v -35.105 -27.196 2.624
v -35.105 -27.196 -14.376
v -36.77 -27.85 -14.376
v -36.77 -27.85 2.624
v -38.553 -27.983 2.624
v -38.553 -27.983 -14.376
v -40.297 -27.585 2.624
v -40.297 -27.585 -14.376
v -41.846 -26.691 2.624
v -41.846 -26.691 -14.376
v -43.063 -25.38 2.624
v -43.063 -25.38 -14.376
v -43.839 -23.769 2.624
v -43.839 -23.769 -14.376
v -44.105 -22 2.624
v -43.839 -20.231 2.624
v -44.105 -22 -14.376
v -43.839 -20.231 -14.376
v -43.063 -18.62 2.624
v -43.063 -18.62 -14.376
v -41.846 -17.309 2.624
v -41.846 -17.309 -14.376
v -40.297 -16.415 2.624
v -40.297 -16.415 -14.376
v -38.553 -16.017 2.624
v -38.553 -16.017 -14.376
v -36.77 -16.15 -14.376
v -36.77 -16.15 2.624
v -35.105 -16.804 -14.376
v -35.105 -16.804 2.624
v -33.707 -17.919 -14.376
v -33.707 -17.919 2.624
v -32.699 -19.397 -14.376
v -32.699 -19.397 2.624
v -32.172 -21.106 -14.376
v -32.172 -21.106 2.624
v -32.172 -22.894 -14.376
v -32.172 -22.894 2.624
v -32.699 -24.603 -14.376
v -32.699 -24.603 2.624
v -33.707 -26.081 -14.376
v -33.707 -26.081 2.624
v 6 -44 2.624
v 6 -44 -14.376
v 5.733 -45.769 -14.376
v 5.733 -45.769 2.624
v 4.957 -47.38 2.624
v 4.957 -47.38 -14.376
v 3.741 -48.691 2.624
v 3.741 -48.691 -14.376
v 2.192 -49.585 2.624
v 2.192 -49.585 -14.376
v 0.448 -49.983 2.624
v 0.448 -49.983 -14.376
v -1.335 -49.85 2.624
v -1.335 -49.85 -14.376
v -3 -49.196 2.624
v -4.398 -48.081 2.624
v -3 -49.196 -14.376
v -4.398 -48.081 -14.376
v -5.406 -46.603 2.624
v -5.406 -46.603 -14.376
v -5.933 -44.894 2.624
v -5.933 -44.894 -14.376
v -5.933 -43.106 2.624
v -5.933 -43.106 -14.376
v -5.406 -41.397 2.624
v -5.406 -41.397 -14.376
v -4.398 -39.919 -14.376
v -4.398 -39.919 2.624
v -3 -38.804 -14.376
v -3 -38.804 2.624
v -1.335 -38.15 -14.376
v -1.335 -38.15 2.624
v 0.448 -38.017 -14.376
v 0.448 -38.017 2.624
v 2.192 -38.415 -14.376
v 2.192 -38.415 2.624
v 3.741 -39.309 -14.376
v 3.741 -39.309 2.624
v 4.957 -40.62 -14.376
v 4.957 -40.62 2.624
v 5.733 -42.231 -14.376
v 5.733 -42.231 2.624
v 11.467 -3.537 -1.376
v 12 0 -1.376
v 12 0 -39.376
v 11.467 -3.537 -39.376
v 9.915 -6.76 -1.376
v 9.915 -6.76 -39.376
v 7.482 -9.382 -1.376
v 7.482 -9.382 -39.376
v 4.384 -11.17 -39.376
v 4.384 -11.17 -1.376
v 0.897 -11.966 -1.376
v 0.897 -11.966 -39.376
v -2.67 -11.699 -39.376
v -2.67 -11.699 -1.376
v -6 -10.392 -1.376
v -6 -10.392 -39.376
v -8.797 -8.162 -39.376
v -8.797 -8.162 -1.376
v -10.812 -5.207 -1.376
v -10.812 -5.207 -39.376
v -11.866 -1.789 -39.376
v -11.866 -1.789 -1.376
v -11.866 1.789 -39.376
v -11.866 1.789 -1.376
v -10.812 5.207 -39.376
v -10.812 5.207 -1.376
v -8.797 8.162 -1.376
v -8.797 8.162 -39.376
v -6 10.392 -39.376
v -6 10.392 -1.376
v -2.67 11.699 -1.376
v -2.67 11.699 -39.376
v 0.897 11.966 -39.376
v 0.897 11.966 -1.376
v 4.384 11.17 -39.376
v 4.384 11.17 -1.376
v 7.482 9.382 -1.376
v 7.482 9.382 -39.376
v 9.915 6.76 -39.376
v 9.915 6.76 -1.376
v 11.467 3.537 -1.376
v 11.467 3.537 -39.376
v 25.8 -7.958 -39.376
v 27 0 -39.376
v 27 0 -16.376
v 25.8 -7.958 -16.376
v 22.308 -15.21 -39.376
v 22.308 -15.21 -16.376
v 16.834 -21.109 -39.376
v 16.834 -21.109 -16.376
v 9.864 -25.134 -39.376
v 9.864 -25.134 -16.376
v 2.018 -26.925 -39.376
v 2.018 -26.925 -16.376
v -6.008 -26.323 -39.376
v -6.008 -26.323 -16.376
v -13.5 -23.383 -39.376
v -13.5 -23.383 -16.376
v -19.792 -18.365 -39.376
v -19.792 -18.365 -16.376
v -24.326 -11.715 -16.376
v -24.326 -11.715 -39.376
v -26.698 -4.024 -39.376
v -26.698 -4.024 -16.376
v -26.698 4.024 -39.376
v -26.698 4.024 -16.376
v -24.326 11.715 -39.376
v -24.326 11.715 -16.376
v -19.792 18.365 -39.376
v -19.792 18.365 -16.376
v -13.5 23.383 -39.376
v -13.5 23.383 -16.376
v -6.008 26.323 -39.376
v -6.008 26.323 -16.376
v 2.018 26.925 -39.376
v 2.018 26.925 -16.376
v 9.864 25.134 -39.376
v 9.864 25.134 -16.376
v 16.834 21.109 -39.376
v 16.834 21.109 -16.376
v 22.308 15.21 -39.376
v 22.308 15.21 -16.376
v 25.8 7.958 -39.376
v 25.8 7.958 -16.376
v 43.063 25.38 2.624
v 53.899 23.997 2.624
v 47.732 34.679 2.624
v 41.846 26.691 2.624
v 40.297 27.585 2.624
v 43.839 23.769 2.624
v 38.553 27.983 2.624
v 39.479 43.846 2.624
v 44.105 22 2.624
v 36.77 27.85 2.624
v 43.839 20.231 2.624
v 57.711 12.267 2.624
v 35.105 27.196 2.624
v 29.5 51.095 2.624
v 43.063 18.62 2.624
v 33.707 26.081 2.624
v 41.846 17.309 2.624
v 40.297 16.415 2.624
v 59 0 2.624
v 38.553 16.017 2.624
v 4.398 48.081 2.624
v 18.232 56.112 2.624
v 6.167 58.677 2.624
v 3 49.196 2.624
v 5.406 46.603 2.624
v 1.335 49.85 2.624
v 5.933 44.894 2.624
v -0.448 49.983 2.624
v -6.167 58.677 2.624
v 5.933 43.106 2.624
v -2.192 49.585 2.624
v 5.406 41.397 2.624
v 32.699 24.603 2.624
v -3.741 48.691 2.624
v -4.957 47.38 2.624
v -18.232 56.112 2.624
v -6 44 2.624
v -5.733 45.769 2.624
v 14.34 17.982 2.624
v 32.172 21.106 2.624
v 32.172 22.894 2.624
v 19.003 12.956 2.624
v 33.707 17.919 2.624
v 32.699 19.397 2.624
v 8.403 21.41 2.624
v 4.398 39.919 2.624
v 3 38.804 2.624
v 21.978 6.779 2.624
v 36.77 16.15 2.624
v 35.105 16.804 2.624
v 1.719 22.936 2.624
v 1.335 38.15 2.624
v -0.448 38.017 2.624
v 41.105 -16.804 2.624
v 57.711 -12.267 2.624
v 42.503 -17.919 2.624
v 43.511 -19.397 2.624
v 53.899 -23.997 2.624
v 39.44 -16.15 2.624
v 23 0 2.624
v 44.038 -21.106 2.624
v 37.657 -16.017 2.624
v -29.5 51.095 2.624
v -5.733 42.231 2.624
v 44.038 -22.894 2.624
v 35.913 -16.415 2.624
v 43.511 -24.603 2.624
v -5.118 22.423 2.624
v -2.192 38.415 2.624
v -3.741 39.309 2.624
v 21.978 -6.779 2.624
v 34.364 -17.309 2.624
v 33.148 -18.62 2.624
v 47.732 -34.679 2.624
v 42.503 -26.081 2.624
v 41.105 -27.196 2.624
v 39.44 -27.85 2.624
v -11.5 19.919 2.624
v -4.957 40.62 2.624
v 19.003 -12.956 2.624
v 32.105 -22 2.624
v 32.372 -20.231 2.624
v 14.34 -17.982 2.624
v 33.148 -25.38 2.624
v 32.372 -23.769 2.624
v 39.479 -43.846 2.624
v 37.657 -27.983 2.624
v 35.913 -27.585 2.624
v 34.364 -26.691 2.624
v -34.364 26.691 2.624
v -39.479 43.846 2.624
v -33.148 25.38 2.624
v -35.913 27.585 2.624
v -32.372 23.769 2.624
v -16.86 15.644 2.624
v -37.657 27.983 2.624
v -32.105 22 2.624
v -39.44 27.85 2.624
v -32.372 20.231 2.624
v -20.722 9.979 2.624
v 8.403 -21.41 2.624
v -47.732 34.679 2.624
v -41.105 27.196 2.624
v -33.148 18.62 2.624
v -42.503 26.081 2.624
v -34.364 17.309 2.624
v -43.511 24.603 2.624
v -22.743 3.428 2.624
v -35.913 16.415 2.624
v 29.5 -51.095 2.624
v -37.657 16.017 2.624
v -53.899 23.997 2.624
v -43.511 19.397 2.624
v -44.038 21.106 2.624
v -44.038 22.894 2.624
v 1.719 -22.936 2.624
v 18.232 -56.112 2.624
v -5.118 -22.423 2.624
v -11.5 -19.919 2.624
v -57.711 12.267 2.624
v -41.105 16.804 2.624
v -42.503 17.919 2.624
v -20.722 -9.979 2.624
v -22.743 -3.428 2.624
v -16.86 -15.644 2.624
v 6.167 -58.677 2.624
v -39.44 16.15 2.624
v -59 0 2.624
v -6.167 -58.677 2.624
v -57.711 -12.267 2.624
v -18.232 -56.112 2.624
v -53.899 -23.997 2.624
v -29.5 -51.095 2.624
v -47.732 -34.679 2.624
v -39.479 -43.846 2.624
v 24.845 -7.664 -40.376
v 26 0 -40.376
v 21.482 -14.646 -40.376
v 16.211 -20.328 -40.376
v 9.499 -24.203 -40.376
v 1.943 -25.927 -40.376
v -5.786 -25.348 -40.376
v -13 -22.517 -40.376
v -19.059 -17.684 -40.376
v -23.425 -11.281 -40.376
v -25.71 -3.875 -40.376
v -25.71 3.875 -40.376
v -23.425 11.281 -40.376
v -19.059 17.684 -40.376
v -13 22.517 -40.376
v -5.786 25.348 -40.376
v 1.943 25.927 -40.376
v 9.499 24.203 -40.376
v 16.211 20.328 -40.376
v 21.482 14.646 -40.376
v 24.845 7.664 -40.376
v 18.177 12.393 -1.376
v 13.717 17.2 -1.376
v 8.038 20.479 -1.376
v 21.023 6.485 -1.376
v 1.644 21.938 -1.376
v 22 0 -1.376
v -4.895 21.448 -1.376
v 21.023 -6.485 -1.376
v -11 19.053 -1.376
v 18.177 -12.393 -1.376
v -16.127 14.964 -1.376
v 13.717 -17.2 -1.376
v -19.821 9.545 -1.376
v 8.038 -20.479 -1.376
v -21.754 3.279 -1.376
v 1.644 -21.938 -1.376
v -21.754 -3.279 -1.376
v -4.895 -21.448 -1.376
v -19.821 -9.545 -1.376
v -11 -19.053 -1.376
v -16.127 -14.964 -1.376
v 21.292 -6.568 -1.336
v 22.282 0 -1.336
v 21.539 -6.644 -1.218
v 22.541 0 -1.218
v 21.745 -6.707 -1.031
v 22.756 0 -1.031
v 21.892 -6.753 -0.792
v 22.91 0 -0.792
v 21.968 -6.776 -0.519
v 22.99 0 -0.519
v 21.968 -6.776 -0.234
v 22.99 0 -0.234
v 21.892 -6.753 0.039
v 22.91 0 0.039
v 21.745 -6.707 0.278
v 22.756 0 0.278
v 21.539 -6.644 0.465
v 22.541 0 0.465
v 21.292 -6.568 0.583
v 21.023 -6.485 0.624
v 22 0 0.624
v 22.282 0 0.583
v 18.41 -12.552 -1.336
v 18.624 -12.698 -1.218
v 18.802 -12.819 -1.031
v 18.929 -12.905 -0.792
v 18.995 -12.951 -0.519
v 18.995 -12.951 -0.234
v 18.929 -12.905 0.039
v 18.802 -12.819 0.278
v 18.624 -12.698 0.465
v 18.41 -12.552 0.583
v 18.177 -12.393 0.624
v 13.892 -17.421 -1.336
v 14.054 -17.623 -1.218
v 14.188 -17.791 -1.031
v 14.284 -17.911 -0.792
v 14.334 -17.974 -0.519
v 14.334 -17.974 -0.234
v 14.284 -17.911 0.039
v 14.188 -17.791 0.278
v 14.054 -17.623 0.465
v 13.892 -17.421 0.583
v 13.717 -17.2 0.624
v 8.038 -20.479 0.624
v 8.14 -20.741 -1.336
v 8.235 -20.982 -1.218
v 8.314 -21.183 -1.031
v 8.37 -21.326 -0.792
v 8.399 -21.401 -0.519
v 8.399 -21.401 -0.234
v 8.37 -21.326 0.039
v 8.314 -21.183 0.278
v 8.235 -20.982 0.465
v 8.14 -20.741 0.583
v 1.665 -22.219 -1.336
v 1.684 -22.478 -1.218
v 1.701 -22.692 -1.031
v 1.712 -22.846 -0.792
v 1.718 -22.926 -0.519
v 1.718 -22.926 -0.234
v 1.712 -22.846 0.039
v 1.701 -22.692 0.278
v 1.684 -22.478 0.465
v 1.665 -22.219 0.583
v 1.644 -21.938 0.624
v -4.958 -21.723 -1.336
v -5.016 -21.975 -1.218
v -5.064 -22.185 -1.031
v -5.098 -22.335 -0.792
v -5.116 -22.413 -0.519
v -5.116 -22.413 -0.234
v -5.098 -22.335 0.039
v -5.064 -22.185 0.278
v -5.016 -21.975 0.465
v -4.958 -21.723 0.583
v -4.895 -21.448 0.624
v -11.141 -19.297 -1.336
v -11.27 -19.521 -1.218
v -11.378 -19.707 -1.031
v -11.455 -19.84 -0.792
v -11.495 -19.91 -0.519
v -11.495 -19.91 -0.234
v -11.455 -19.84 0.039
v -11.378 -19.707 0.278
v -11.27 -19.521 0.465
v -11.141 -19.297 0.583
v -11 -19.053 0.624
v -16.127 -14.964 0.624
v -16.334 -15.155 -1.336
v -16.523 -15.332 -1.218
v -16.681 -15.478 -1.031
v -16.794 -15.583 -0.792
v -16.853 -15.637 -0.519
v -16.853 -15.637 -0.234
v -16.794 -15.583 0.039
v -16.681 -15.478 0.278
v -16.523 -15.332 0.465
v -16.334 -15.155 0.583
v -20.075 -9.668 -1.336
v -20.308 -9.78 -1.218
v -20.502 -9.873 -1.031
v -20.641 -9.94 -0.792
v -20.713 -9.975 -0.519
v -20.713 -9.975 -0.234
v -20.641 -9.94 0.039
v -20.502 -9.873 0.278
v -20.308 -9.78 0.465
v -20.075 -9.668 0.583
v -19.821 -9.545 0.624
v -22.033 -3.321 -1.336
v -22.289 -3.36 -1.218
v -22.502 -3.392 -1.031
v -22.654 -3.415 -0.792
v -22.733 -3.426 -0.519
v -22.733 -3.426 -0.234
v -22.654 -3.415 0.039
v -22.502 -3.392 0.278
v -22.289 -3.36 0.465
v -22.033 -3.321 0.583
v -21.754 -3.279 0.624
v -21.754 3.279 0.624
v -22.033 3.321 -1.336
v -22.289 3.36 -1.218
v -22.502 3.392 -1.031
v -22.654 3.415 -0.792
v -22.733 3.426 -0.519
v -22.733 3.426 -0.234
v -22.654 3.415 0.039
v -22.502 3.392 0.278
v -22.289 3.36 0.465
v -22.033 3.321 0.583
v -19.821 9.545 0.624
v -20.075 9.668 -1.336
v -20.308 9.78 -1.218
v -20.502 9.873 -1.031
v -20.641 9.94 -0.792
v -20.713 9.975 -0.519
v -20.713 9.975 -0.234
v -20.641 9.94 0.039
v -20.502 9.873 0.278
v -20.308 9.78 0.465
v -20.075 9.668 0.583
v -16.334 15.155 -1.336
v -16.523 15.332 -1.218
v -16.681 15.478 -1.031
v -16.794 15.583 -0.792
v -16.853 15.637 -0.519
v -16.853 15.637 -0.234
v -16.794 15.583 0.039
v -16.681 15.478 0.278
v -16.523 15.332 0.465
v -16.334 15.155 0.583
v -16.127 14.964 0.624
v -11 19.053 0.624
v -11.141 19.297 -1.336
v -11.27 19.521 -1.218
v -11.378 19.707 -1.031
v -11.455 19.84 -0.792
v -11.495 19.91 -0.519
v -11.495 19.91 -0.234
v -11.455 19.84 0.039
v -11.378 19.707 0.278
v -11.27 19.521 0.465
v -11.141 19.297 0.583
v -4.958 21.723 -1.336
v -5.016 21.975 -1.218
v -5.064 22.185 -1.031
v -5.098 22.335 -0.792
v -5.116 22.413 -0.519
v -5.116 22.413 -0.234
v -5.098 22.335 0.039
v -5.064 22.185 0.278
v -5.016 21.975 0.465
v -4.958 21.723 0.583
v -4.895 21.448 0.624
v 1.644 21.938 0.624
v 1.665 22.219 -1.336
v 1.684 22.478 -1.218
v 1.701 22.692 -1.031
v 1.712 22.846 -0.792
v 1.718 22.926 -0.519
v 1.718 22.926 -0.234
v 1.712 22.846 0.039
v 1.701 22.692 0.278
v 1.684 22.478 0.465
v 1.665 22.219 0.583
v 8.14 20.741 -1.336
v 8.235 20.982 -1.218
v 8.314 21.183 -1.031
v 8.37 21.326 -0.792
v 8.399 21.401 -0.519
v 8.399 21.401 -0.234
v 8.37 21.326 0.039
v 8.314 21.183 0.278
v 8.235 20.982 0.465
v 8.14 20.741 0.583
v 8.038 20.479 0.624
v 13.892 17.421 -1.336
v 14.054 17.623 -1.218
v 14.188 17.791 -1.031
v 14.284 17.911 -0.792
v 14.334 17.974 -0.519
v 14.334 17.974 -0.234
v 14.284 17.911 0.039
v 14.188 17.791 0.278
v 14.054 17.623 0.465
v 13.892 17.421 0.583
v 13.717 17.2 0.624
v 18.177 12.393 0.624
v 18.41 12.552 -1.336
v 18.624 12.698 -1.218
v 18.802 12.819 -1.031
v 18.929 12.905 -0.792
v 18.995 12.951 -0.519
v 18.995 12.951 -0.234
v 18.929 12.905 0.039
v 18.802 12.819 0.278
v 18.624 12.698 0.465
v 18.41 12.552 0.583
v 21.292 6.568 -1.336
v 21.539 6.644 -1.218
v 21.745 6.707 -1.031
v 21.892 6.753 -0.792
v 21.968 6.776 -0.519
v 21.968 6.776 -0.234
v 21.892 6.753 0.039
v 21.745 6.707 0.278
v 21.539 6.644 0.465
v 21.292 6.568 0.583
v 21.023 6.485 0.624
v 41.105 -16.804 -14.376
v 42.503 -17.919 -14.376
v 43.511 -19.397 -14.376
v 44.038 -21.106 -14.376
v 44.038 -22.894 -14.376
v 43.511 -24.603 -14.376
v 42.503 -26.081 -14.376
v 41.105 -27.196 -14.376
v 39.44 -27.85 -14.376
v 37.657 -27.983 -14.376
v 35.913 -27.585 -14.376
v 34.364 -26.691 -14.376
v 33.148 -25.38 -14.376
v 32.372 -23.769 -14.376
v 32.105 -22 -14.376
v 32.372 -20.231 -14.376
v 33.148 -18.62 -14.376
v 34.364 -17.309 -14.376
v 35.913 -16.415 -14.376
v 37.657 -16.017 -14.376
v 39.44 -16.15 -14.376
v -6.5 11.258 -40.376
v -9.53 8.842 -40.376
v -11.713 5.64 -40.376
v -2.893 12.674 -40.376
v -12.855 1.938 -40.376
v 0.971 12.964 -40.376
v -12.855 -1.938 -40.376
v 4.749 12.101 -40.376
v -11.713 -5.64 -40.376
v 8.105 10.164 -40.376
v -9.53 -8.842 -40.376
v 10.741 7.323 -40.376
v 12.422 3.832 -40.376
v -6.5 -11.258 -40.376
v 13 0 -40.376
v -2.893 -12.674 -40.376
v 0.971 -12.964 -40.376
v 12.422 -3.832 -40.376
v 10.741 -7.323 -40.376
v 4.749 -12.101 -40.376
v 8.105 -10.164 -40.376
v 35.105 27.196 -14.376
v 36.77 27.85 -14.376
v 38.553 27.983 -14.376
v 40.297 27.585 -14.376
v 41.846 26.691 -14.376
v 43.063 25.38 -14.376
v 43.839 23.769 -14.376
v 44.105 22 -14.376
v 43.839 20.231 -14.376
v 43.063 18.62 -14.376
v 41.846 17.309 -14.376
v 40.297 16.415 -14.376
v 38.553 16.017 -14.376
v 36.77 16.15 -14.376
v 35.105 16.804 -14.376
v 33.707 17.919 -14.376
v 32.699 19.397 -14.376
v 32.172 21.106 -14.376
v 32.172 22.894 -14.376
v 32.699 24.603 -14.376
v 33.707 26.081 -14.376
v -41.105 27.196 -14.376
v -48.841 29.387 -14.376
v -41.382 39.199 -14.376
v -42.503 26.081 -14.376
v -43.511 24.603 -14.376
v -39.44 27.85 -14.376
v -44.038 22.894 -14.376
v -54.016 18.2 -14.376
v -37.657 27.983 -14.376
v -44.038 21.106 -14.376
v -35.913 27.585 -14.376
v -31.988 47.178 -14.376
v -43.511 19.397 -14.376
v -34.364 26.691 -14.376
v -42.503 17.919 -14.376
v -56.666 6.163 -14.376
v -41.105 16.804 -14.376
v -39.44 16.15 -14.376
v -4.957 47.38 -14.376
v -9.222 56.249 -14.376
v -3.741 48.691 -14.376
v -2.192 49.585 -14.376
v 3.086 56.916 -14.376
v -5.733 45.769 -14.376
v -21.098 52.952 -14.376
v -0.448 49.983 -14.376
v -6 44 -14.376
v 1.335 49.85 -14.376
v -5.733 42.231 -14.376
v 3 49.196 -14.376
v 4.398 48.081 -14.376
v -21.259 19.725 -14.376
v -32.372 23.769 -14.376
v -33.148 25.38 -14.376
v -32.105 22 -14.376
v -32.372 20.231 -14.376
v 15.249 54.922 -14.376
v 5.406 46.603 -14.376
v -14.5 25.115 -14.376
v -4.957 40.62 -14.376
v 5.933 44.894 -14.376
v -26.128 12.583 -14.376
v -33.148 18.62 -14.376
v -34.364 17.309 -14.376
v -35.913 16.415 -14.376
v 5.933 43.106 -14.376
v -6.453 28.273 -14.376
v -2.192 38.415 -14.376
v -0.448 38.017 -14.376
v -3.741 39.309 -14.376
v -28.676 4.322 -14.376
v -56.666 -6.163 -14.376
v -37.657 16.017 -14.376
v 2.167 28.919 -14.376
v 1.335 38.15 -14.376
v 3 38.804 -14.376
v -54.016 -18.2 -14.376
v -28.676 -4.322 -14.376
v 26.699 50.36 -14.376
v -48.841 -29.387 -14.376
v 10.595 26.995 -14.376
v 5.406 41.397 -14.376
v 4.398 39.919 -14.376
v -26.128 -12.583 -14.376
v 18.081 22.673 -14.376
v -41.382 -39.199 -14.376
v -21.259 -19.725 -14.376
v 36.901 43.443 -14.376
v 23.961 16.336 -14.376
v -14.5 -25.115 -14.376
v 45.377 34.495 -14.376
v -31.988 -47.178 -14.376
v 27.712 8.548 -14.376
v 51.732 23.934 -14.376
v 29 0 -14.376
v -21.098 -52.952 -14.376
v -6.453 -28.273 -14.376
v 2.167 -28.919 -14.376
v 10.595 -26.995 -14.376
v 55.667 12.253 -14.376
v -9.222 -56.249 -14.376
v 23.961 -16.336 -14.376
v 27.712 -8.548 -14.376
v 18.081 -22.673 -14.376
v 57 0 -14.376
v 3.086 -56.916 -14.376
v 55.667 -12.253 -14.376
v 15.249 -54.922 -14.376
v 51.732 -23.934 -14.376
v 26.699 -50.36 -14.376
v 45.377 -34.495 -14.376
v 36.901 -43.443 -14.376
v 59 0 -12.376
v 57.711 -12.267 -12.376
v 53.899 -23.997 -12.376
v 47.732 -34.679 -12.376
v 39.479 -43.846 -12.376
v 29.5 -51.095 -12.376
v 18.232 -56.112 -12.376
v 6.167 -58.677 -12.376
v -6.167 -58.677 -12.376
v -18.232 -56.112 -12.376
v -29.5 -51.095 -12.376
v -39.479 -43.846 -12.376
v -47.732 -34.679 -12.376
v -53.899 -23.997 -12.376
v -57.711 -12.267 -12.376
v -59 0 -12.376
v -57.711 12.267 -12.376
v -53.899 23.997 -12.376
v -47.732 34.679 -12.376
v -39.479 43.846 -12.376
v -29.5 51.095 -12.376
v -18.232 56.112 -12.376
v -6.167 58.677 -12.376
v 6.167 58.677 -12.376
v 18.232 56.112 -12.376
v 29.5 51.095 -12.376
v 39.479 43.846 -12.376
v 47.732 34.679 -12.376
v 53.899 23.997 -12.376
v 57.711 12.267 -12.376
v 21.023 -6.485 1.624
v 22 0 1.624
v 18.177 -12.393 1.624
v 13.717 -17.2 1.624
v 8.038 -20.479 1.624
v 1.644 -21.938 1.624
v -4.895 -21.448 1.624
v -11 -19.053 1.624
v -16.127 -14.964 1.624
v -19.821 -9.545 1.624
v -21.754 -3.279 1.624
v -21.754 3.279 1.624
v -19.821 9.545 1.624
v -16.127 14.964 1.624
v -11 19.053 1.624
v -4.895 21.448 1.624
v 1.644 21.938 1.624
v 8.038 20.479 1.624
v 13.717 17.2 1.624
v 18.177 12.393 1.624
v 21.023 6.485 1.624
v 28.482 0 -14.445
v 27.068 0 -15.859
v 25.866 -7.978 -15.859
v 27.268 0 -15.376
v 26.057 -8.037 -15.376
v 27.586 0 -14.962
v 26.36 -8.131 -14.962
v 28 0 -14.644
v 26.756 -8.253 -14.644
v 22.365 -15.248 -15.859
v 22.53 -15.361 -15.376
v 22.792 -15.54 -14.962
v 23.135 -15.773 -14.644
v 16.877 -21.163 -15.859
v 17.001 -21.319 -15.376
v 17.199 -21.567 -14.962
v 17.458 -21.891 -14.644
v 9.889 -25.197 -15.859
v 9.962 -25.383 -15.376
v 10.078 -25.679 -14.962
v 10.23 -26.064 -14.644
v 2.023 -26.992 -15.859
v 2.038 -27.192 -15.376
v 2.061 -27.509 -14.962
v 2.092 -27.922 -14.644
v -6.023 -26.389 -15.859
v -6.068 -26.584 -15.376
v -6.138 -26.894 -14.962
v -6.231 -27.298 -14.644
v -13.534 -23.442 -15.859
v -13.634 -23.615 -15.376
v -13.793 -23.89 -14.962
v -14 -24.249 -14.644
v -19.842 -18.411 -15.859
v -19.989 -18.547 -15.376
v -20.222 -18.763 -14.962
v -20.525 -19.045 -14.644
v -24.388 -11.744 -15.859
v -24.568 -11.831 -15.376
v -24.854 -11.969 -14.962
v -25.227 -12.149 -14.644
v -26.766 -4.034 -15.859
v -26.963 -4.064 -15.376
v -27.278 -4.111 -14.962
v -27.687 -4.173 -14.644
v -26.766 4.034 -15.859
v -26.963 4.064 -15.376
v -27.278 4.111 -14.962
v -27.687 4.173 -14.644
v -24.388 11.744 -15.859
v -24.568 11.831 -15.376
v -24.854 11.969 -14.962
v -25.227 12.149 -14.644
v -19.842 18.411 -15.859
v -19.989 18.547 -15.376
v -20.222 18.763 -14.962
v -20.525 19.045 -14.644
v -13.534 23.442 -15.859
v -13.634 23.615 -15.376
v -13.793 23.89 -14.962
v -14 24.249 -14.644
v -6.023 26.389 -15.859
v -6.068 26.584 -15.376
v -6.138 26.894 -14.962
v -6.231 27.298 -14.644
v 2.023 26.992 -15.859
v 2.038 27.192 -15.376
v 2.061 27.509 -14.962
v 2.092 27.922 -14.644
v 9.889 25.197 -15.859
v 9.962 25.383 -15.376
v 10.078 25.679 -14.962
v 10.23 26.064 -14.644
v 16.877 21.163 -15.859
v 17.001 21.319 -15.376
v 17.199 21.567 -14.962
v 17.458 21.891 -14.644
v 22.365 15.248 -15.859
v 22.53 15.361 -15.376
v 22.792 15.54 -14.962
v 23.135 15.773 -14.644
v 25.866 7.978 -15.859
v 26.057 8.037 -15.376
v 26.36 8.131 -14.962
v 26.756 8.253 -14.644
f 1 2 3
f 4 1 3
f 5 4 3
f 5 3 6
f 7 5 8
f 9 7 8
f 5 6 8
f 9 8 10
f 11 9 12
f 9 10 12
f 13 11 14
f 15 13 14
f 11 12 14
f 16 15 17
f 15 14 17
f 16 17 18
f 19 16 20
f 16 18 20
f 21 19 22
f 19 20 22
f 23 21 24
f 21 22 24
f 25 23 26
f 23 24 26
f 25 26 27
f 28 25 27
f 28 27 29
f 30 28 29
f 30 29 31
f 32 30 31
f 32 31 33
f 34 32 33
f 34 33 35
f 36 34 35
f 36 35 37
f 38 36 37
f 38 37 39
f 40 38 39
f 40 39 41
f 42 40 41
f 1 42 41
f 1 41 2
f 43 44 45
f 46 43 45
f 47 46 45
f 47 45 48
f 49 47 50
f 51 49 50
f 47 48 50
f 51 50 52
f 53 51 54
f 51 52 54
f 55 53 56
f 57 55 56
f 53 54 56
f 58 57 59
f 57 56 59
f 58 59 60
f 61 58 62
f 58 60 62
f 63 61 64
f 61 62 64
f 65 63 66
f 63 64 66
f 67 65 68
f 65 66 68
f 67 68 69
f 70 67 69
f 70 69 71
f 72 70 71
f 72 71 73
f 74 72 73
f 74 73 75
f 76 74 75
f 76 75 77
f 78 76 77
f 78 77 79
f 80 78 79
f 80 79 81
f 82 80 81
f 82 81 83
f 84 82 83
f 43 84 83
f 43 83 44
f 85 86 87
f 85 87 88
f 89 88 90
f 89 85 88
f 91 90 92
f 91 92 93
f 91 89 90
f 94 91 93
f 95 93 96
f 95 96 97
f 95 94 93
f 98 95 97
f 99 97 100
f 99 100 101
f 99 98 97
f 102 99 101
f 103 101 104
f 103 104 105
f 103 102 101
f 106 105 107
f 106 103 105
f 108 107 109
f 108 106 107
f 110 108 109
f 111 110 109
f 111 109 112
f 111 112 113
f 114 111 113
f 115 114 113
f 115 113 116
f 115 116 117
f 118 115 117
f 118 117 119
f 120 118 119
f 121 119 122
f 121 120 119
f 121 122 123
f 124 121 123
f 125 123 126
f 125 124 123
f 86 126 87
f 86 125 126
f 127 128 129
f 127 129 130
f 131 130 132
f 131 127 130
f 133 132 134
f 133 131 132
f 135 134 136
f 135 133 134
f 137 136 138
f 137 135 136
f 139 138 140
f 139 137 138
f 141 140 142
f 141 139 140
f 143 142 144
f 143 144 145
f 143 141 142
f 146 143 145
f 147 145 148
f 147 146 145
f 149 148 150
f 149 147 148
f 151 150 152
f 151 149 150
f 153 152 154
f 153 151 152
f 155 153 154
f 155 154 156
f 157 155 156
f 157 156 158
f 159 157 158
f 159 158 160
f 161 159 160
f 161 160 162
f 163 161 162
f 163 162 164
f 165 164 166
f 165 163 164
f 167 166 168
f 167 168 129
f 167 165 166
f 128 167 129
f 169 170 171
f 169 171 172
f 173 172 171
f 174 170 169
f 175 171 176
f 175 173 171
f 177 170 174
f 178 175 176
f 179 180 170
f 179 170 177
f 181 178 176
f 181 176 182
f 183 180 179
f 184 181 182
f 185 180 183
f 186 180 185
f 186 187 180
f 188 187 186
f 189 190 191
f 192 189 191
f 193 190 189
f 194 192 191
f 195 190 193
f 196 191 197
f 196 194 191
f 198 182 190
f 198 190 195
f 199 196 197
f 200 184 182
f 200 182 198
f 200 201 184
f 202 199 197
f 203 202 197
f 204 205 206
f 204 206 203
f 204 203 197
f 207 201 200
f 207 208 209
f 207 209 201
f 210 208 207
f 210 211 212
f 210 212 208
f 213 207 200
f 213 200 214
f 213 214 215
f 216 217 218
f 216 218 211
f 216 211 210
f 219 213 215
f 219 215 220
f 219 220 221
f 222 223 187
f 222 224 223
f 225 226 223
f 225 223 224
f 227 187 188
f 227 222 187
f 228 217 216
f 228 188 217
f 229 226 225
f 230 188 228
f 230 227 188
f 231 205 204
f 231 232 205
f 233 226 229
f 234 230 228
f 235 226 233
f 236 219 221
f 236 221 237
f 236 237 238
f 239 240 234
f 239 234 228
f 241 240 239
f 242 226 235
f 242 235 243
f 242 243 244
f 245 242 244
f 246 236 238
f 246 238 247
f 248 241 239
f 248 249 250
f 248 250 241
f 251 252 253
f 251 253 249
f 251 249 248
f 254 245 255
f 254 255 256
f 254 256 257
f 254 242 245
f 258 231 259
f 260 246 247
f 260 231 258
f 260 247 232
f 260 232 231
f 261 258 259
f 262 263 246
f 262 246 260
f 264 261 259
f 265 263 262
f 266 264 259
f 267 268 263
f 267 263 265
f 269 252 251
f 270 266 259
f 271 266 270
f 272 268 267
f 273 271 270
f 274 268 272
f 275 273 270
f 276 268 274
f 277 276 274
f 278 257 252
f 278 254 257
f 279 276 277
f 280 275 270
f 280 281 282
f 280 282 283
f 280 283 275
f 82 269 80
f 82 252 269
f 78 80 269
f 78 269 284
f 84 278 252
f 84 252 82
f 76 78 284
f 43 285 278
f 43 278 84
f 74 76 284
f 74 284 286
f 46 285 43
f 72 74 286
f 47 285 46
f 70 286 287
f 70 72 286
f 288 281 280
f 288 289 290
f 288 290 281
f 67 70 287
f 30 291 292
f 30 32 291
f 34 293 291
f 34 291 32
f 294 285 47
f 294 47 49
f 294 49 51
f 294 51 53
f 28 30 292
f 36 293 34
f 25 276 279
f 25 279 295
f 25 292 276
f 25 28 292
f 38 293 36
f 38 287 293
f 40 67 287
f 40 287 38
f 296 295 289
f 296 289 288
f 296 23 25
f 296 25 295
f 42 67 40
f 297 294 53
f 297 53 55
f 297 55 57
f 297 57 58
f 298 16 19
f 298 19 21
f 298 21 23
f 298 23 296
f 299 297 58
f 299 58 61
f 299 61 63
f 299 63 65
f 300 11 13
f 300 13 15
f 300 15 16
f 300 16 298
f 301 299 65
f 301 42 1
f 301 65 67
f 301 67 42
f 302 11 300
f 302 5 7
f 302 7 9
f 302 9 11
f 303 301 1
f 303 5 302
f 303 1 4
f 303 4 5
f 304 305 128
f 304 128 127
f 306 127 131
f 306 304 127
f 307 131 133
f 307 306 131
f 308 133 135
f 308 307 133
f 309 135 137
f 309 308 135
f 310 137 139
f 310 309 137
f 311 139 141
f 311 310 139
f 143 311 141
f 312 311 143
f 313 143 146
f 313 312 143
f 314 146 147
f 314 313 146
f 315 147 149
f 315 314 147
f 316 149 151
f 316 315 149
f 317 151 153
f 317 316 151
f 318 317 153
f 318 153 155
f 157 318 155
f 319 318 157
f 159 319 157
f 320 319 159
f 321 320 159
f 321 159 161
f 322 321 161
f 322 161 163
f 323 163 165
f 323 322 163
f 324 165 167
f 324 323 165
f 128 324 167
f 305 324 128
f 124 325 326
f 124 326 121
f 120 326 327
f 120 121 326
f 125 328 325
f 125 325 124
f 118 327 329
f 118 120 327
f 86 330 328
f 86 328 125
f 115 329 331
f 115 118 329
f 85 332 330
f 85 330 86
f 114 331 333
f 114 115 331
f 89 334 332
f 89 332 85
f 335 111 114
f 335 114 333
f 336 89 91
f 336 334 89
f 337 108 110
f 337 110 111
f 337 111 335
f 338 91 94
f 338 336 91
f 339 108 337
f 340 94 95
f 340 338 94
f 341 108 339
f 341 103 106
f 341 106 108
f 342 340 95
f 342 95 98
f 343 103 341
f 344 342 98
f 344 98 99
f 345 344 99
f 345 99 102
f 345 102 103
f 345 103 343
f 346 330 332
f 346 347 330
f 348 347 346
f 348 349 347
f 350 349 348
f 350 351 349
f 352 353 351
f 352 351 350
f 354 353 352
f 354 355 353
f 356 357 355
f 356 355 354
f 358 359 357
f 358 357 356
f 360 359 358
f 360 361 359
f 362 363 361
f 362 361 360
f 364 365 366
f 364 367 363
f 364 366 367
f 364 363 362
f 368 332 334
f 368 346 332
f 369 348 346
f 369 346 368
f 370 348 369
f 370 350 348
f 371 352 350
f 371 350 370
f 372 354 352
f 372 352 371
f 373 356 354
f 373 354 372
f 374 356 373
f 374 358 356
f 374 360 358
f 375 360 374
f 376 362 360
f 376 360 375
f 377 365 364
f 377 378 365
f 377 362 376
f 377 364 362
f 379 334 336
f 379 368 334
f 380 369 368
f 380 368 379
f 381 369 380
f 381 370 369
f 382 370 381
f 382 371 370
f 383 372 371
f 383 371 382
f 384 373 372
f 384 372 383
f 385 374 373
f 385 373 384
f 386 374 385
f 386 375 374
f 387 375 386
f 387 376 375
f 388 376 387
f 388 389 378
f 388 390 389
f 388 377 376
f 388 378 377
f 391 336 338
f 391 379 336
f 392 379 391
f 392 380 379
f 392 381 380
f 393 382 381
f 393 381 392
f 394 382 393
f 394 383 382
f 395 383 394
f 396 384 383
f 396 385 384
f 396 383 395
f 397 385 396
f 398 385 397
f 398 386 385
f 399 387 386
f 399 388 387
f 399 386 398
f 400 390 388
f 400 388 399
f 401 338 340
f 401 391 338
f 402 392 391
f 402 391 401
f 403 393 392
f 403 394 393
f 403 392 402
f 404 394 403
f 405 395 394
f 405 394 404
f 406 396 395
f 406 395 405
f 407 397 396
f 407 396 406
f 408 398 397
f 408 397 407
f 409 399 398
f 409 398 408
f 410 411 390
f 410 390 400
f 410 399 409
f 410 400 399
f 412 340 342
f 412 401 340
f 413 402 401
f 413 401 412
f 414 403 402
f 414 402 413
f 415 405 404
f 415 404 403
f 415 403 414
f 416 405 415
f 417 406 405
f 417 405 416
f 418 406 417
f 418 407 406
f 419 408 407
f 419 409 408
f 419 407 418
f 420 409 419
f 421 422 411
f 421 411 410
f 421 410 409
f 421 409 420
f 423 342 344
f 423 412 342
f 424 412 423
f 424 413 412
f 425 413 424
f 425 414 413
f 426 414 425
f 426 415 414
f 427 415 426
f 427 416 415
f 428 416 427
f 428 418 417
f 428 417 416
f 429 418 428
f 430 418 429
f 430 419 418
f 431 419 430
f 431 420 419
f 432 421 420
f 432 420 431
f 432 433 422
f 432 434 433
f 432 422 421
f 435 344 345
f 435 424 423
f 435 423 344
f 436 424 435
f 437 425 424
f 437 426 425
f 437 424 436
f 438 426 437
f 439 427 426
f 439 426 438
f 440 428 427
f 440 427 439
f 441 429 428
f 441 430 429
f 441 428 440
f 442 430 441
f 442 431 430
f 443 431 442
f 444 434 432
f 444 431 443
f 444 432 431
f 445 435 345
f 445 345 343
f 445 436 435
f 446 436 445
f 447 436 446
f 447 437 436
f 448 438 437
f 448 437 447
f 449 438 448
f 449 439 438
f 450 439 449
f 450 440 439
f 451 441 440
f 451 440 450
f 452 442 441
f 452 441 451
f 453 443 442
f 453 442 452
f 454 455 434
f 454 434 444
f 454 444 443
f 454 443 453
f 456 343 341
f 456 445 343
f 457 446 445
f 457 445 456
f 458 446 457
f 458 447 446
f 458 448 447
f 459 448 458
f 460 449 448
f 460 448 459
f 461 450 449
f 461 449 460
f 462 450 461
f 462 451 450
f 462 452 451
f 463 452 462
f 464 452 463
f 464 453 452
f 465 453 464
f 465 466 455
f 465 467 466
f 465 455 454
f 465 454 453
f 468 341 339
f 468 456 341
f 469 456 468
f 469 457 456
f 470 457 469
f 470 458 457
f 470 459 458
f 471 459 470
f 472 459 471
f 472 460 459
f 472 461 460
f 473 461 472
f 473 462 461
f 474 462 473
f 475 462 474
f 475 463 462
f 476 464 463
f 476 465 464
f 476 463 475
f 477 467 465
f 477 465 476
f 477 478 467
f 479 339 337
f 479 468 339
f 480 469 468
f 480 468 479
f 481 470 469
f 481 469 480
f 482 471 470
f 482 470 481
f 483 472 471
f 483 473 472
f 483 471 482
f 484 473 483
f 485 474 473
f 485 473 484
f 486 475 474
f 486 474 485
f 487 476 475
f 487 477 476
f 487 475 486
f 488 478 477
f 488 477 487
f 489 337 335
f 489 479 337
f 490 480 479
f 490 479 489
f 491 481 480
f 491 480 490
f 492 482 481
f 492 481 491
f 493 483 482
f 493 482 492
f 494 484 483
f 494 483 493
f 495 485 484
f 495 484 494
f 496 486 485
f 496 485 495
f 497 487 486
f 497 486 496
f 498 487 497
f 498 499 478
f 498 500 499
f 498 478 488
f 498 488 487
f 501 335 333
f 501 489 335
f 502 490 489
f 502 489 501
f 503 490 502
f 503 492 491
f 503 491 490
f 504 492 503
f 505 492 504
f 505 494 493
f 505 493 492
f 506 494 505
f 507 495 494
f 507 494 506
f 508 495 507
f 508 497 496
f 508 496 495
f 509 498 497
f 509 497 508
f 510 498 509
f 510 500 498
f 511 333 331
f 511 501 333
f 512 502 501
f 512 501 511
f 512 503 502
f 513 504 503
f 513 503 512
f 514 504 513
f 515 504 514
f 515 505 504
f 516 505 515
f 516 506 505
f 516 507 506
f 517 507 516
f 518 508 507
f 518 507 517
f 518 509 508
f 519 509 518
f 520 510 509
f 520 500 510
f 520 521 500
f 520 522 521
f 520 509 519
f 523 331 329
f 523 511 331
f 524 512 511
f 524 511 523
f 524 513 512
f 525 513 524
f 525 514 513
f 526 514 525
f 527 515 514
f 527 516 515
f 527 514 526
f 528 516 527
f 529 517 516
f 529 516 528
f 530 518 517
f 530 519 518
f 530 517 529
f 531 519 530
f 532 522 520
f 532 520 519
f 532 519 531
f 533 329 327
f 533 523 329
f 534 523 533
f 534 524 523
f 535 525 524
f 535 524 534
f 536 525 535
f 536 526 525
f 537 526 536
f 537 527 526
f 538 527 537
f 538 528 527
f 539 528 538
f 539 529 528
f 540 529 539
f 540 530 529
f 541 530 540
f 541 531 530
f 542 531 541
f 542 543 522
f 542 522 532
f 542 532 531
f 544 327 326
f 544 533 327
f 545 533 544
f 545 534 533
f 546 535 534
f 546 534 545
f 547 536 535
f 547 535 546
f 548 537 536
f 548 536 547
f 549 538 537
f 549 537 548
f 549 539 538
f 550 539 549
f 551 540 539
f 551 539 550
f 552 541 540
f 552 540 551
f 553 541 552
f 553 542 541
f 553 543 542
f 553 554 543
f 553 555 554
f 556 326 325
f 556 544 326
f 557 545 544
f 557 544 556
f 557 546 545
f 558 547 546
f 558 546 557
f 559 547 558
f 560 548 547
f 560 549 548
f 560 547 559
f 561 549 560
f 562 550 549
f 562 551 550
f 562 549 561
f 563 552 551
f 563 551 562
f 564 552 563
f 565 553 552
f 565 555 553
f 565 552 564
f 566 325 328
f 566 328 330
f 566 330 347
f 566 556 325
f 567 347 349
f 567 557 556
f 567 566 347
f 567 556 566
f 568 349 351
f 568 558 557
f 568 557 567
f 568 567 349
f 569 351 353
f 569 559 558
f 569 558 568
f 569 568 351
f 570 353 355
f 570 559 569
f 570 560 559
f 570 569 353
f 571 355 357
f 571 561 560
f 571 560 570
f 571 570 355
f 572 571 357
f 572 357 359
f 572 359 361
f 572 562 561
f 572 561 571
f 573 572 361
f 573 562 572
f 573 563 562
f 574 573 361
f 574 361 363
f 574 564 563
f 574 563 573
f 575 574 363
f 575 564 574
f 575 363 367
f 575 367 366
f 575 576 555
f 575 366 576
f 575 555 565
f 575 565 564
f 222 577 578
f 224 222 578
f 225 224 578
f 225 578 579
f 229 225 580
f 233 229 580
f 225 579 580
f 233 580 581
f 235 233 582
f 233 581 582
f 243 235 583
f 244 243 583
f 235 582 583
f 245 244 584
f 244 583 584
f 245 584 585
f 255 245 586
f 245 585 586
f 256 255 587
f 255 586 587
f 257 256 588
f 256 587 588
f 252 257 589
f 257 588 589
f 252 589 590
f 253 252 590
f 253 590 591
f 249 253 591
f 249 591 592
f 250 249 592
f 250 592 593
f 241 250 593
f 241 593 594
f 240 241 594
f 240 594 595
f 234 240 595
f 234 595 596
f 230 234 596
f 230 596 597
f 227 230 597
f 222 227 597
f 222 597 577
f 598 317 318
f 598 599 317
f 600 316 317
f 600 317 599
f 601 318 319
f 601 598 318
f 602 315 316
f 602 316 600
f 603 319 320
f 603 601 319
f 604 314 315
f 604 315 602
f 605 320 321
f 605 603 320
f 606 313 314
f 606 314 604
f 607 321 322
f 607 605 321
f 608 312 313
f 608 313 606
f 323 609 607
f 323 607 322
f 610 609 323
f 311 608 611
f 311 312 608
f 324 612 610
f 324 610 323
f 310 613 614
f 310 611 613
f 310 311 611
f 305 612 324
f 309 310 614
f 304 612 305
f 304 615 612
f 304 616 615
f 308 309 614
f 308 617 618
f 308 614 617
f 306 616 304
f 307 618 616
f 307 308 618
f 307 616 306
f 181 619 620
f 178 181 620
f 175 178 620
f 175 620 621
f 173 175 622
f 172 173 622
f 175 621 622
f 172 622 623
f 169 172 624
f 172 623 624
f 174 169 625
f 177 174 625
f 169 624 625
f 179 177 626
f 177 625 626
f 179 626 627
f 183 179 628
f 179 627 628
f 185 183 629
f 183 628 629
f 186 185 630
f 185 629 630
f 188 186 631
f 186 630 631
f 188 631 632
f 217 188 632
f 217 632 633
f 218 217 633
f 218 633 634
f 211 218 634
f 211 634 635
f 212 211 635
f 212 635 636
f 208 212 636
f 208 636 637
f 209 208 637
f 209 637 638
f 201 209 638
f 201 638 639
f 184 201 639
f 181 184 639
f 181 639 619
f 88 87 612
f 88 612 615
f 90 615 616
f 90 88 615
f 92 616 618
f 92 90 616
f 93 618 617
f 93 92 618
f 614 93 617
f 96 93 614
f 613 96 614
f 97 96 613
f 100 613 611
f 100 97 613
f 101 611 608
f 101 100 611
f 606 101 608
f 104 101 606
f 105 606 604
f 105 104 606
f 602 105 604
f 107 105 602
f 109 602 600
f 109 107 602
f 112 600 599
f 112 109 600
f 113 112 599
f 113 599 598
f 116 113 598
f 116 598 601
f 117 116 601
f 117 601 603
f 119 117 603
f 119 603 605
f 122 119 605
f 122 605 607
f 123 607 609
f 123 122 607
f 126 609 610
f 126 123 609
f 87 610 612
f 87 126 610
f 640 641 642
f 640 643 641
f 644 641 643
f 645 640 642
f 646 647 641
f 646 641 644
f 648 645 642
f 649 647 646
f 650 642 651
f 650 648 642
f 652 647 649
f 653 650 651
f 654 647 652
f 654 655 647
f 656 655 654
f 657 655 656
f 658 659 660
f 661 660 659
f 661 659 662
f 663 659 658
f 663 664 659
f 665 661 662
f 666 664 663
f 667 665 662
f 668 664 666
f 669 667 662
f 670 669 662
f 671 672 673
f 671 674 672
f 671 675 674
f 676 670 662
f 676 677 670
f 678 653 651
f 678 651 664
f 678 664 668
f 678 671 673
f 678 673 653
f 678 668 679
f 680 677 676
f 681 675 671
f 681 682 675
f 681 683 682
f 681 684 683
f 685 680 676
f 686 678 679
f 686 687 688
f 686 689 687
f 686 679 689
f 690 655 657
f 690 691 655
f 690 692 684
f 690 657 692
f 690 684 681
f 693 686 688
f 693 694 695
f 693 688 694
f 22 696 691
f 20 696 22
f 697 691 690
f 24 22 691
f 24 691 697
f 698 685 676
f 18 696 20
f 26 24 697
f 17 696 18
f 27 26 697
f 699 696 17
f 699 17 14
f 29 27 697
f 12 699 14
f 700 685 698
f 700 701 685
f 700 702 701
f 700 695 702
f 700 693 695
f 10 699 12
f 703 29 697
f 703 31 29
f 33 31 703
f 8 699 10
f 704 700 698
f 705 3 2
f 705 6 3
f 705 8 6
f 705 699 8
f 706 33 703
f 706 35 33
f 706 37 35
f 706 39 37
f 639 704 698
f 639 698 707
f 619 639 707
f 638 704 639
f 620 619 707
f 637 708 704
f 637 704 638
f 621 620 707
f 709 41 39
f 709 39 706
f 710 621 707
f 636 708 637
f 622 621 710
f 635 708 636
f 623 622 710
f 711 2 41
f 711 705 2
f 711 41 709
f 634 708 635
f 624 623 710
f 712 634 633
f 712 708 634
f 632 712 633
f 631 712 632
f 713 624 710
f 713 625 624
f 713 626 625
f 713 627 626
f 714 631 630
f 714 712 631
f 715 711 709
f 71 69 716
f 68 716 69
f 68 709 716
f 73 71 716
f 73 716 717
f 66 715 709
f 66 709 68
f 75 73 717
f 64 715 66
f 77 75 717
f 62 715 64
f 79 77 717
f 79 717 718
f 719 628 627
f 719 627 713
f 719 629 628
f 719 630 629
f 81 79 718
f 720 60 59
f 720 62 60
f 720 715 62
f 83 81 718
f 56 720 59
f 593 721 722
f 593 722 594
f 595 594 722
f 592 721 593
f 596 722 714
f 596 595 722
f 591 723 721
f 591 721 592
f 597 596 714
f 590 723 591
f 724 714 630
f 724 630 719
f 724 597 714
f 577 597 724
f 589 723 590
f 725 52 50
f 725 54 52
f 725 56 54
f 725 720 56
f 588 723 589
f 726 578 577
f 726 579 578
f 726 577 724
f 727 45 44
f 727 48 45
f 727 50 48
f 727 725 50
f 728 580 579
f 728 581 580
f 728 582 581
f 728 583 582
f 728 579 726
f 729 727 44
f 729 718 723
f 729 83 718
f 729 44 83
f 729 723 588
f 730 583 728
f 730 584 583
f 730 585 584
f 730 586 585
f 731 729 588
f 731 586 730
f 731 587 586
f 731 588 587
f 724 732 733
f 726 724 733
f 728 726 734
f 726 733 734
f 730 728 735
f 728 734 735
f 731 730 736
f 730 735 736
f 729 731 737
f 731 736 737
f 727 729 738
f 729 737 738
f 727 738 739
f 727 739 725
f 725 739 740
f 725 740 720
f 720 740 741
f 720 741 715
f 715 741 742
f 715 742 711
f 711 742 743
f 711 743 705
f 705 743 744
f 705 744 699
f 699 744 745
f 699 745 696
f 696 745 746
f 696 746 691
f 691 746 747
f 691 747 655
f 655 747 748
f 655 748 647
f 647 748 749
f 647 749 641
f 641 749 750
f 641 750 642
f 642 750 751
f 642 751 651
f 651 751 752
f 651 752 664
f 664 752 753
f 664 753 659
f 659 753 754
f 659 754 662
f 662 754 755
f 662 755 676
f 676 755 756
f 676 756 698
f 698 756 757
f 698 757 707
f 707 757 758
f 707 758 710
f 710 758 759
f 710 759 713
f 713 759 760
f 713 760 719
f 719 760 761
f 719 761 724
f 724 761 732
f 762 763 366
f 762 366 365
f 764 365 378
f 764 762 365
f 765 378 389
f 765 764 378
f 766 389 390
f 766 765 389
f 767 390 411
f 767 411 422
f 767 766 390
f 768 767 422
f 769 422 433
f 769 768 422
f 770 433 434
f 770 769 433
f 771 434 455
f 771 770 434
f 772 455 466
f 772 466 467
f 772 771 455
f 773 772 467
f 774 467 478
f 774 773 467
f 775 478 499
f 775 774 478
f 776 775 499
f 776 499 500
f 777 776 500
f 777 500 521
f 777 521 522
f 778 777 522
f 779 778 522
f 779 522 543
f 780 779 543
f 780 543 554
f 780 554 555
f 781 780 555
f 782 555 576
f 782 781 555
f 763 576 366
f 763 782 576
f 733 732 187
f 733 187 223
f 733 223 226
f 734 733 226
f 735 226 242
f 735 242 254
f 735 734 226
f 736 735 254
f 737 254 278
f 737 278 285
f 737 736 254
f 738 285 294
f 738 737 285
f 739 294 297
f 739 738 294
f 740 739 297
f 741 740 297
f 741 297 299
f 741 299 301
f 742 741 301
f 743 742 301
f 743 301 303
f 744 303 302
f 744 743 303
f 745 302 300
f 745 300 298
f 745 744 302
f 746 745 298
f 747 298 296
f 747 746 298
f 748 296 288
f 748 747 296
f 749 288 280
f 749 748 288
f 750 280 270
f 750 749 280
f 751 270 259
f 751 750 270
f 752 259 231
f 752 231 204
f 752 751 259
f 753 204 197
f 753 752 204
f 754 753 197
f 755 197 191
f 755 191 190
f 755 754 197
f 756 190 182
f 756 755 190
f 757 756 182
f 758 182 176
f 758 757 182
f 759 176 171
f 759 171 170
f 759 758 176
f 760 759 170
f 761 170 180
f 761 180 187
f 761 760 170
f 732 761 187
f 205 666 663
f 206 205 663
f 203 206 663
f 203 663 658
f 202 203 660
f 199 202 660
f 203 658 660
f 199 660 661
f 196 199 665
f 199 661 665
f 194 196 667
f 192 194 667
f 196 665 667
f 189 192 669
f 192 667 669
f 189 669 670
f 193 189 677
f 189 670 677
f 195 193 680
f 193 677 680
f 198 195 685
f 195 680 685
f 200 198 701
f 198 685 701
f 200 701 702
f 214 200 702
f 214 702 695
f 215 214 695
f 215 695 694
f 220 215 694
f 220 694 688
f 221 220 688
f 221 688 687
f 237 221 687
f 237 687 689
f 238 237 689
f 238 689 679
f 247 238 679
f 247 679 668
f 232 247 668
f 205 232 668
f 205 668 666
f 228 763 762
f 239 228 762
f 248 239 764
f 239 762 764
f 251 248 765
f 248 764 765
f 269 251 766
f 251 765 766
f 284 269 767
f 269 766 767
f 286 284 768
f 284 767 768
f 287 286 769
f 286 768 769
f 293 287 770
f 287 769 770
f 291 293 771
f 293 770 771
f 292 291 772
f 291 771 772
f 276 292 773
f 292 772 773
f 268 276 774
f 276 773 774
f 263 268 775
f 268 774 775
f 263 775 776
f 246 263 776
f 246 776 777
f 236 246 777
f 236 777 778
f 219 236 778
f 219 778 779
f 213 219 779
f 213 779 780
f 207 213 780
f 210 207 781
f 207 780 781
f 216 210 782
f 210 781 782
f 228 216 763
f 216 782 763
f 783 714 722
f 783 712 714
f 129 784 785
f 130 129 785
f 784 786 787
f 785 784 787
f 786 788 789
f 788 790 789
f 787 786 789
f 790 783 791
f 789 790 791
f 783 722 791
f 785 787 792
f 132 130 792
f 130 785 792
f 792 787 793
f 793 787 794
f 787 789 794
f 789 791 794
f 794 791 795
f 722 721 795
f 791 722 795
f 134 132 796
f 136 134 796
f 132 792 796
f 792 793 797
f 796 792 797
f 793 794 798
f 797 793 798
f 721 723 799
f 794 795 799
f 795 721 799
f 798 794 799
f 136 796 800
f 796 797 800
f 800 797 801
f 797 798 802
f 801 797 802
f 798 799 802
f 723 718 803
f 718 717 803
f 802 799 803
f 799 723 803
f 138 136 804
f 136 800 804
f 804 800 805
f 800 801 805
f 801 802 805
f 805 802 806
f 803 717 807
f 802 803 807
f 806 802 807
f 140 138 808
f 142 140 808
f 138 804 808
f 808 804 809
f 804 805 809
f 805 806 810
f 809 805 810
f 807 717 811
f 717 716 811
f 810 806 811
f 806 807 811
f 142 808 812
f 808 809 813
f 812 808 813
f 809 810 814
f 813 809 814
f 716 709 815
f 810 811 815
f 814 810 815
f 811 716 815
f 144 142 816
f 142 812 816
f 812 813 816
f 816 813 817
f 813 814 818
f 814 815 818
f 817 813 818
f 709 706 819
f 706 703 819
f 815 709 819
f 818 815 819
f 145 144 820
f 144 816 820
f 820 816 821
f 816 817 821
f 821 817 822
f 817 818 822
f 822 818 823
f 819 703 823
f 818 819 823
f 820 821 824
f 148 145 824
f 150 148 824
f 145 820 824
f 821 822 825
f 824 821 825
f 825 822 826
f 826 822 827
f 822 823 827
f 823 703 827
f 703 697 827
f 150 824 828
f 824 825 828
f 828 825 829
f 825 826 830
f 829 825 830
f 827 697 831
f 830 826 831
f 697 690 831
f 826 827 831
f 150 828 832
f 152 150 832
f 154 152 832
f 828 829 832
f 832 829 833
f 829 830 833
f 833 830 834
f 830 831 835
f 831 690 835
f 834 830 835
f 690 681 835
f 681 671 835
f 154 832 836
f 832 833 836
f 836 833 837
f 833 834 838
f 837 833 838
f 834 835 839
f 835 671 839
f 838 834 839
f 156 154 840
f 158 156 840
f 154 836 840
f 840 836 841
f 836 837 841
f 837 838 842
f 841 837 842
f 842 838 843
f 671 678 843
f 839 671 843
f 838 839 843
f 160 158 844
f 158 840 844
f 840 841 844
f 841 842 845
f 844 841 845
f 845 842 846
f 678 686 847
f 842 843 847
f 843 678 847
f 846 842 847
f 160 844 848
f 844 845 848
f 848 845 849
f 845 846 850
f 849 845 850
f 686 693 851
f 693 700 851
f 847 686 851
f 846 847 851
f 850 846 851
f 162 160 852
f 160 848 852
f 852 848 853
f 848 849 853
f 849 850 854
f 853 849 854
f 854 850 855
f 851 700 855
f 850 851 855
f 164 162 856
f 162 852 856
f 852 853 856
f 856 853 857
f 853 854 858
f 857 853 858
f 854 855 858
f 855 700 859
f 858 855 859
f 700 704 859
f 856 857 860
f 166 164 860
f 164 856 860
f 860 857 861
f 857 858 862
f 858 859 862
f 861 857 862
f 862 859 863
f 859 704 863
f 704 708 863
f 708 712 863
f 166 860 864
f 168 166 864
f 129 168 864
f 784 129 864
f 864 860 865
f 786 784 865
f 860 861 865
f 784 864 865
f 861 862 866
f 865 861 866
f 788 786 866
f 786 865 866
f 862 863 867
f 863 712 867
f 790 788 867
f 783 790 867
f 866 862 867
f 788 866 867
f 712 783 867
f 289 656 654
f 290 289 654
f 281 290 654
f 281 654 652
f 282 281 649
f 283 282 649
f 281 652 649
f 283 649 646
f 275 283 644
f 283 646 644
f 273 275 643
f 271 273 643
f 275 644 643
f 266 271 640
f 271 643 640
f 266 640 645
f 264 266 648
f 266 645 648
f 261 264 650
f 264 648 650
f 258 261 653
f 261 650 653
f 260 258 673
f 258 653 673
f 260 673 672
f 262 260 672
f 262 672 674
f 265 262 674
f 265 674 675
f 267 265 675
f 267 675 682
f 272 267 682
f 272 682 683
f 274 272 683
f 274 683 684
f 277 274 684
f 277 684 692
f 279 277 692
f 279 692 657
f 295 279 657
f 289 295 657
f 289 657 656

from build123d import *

# Parameters (mm, degrees)
CUT_EXTRUDE1_REACH = 89.396
SKETCH2_R          = 6
CIRPATTERN1_COUNT  = 6
FILLET1_R          = 2
CHAMFER1_SIZE      = 1
CHAMFER2_SIZE      = 2


with BuildPart() as part:
    # Sketch1 → Revolve1 (revolve)
    with BuildSketch(Plane(origin=(0, 0, 0), x_dir=(0, 0, -1), z_dir=(1, 0, 0)), mode=Mode.PRIVATE) as revolve1_sk:
        with BuildLine():
            Line((1.376389422, 12), (1.376389422, 22))
            ThreePointArc((1.376389422, 22), (0.376389422, 23), (-0.623610578, 22))
            Line((-0.623610578, 22), (-2.623610578, 22))
            Line((-2.623610578, 22), (-2.623610578, 59))
            Line((-2.623610578, 59), (14.376389422, 59))
            Line((14.376389422, 59), (14.376389422, 27))
            Line((14.376389422, 27), (40.376389422, 27))
            Line((40.376389422, 27), (40.376389422, 12))
            Line((40.376389422, 12), (1.376389422, 12))
        make_face()
    revolve(revolve1_sk.sketch.rotate(Axis((0, 0, 9.001223373), (0, 0, -1)), 90), axis=Axis((0, 0, 9.001223373), (0, 0, -1)))

    # Sketch2 → Cut-Extrude1 (cut, up to next)
    with BuildSketch(Plane(origin=(0, 0, -14.376389422), x_dir=(-1, 0, 0), z_dir=(0, 0, -1)), mode=Mode.PRIVATE) as cut_extrude1_sk1:
        with Locations((0, 44)):
            Circle(SKETCH2_R)
    cut_extrude1_tool1 = extrude(cut_extrude1_sk1.sketch, amount=-CUT_EXTRUDE1_REACH, mode=Mode.PRIVATE) & part.part
    cut_extrude1 = cut_extrude1_tool1.solids().sort_by_distance((0, 44, -14.376389))[0]
    add(cut_extrude1, mode=Mode.SUBTRACT)

    # CirPattern1: Cut-Extrude1 ×6 about axis
    cirpattern1_axis = Axis((0, 0, 0), (0, 0, 1))
    for i in range(1, CIRPATTERN1_COUNT):
        add(cut_extrude1.rotate(cirpattern1_axis, i * 360 / CIRPATTERN1_COUNT), mode=Mode.SUBTRACT)

    # Fillet1
    fillet1_edges = [part.edges().sort_by_distance(p)[0] for p in [
        (-27, 0, -14.376389422),
    ]]
    fillet(fillet1_edges, radius=FILLET1_R)

    # Chamfer1
    chamfer1_edges = [part.edges().sort_by_distance(p)[0] for p in [
        (-12, 0, -40.376389422),
        (-22, 0, 2.623610578),
        (-27, 0, -40.376389422),
    ]]
    chamfer(chamfer1_edges, length=CHAMFER1_SIZE)

    # Chamfer2
    chamfer2_edges = [part.edges().sort_by_distance(p)[0] for p in [
        (-59, 0, -14.376389422),
    ]]
    chamfer(chamfer2_edges, length=CHAMFER2_SIZE)


solid = part.part
